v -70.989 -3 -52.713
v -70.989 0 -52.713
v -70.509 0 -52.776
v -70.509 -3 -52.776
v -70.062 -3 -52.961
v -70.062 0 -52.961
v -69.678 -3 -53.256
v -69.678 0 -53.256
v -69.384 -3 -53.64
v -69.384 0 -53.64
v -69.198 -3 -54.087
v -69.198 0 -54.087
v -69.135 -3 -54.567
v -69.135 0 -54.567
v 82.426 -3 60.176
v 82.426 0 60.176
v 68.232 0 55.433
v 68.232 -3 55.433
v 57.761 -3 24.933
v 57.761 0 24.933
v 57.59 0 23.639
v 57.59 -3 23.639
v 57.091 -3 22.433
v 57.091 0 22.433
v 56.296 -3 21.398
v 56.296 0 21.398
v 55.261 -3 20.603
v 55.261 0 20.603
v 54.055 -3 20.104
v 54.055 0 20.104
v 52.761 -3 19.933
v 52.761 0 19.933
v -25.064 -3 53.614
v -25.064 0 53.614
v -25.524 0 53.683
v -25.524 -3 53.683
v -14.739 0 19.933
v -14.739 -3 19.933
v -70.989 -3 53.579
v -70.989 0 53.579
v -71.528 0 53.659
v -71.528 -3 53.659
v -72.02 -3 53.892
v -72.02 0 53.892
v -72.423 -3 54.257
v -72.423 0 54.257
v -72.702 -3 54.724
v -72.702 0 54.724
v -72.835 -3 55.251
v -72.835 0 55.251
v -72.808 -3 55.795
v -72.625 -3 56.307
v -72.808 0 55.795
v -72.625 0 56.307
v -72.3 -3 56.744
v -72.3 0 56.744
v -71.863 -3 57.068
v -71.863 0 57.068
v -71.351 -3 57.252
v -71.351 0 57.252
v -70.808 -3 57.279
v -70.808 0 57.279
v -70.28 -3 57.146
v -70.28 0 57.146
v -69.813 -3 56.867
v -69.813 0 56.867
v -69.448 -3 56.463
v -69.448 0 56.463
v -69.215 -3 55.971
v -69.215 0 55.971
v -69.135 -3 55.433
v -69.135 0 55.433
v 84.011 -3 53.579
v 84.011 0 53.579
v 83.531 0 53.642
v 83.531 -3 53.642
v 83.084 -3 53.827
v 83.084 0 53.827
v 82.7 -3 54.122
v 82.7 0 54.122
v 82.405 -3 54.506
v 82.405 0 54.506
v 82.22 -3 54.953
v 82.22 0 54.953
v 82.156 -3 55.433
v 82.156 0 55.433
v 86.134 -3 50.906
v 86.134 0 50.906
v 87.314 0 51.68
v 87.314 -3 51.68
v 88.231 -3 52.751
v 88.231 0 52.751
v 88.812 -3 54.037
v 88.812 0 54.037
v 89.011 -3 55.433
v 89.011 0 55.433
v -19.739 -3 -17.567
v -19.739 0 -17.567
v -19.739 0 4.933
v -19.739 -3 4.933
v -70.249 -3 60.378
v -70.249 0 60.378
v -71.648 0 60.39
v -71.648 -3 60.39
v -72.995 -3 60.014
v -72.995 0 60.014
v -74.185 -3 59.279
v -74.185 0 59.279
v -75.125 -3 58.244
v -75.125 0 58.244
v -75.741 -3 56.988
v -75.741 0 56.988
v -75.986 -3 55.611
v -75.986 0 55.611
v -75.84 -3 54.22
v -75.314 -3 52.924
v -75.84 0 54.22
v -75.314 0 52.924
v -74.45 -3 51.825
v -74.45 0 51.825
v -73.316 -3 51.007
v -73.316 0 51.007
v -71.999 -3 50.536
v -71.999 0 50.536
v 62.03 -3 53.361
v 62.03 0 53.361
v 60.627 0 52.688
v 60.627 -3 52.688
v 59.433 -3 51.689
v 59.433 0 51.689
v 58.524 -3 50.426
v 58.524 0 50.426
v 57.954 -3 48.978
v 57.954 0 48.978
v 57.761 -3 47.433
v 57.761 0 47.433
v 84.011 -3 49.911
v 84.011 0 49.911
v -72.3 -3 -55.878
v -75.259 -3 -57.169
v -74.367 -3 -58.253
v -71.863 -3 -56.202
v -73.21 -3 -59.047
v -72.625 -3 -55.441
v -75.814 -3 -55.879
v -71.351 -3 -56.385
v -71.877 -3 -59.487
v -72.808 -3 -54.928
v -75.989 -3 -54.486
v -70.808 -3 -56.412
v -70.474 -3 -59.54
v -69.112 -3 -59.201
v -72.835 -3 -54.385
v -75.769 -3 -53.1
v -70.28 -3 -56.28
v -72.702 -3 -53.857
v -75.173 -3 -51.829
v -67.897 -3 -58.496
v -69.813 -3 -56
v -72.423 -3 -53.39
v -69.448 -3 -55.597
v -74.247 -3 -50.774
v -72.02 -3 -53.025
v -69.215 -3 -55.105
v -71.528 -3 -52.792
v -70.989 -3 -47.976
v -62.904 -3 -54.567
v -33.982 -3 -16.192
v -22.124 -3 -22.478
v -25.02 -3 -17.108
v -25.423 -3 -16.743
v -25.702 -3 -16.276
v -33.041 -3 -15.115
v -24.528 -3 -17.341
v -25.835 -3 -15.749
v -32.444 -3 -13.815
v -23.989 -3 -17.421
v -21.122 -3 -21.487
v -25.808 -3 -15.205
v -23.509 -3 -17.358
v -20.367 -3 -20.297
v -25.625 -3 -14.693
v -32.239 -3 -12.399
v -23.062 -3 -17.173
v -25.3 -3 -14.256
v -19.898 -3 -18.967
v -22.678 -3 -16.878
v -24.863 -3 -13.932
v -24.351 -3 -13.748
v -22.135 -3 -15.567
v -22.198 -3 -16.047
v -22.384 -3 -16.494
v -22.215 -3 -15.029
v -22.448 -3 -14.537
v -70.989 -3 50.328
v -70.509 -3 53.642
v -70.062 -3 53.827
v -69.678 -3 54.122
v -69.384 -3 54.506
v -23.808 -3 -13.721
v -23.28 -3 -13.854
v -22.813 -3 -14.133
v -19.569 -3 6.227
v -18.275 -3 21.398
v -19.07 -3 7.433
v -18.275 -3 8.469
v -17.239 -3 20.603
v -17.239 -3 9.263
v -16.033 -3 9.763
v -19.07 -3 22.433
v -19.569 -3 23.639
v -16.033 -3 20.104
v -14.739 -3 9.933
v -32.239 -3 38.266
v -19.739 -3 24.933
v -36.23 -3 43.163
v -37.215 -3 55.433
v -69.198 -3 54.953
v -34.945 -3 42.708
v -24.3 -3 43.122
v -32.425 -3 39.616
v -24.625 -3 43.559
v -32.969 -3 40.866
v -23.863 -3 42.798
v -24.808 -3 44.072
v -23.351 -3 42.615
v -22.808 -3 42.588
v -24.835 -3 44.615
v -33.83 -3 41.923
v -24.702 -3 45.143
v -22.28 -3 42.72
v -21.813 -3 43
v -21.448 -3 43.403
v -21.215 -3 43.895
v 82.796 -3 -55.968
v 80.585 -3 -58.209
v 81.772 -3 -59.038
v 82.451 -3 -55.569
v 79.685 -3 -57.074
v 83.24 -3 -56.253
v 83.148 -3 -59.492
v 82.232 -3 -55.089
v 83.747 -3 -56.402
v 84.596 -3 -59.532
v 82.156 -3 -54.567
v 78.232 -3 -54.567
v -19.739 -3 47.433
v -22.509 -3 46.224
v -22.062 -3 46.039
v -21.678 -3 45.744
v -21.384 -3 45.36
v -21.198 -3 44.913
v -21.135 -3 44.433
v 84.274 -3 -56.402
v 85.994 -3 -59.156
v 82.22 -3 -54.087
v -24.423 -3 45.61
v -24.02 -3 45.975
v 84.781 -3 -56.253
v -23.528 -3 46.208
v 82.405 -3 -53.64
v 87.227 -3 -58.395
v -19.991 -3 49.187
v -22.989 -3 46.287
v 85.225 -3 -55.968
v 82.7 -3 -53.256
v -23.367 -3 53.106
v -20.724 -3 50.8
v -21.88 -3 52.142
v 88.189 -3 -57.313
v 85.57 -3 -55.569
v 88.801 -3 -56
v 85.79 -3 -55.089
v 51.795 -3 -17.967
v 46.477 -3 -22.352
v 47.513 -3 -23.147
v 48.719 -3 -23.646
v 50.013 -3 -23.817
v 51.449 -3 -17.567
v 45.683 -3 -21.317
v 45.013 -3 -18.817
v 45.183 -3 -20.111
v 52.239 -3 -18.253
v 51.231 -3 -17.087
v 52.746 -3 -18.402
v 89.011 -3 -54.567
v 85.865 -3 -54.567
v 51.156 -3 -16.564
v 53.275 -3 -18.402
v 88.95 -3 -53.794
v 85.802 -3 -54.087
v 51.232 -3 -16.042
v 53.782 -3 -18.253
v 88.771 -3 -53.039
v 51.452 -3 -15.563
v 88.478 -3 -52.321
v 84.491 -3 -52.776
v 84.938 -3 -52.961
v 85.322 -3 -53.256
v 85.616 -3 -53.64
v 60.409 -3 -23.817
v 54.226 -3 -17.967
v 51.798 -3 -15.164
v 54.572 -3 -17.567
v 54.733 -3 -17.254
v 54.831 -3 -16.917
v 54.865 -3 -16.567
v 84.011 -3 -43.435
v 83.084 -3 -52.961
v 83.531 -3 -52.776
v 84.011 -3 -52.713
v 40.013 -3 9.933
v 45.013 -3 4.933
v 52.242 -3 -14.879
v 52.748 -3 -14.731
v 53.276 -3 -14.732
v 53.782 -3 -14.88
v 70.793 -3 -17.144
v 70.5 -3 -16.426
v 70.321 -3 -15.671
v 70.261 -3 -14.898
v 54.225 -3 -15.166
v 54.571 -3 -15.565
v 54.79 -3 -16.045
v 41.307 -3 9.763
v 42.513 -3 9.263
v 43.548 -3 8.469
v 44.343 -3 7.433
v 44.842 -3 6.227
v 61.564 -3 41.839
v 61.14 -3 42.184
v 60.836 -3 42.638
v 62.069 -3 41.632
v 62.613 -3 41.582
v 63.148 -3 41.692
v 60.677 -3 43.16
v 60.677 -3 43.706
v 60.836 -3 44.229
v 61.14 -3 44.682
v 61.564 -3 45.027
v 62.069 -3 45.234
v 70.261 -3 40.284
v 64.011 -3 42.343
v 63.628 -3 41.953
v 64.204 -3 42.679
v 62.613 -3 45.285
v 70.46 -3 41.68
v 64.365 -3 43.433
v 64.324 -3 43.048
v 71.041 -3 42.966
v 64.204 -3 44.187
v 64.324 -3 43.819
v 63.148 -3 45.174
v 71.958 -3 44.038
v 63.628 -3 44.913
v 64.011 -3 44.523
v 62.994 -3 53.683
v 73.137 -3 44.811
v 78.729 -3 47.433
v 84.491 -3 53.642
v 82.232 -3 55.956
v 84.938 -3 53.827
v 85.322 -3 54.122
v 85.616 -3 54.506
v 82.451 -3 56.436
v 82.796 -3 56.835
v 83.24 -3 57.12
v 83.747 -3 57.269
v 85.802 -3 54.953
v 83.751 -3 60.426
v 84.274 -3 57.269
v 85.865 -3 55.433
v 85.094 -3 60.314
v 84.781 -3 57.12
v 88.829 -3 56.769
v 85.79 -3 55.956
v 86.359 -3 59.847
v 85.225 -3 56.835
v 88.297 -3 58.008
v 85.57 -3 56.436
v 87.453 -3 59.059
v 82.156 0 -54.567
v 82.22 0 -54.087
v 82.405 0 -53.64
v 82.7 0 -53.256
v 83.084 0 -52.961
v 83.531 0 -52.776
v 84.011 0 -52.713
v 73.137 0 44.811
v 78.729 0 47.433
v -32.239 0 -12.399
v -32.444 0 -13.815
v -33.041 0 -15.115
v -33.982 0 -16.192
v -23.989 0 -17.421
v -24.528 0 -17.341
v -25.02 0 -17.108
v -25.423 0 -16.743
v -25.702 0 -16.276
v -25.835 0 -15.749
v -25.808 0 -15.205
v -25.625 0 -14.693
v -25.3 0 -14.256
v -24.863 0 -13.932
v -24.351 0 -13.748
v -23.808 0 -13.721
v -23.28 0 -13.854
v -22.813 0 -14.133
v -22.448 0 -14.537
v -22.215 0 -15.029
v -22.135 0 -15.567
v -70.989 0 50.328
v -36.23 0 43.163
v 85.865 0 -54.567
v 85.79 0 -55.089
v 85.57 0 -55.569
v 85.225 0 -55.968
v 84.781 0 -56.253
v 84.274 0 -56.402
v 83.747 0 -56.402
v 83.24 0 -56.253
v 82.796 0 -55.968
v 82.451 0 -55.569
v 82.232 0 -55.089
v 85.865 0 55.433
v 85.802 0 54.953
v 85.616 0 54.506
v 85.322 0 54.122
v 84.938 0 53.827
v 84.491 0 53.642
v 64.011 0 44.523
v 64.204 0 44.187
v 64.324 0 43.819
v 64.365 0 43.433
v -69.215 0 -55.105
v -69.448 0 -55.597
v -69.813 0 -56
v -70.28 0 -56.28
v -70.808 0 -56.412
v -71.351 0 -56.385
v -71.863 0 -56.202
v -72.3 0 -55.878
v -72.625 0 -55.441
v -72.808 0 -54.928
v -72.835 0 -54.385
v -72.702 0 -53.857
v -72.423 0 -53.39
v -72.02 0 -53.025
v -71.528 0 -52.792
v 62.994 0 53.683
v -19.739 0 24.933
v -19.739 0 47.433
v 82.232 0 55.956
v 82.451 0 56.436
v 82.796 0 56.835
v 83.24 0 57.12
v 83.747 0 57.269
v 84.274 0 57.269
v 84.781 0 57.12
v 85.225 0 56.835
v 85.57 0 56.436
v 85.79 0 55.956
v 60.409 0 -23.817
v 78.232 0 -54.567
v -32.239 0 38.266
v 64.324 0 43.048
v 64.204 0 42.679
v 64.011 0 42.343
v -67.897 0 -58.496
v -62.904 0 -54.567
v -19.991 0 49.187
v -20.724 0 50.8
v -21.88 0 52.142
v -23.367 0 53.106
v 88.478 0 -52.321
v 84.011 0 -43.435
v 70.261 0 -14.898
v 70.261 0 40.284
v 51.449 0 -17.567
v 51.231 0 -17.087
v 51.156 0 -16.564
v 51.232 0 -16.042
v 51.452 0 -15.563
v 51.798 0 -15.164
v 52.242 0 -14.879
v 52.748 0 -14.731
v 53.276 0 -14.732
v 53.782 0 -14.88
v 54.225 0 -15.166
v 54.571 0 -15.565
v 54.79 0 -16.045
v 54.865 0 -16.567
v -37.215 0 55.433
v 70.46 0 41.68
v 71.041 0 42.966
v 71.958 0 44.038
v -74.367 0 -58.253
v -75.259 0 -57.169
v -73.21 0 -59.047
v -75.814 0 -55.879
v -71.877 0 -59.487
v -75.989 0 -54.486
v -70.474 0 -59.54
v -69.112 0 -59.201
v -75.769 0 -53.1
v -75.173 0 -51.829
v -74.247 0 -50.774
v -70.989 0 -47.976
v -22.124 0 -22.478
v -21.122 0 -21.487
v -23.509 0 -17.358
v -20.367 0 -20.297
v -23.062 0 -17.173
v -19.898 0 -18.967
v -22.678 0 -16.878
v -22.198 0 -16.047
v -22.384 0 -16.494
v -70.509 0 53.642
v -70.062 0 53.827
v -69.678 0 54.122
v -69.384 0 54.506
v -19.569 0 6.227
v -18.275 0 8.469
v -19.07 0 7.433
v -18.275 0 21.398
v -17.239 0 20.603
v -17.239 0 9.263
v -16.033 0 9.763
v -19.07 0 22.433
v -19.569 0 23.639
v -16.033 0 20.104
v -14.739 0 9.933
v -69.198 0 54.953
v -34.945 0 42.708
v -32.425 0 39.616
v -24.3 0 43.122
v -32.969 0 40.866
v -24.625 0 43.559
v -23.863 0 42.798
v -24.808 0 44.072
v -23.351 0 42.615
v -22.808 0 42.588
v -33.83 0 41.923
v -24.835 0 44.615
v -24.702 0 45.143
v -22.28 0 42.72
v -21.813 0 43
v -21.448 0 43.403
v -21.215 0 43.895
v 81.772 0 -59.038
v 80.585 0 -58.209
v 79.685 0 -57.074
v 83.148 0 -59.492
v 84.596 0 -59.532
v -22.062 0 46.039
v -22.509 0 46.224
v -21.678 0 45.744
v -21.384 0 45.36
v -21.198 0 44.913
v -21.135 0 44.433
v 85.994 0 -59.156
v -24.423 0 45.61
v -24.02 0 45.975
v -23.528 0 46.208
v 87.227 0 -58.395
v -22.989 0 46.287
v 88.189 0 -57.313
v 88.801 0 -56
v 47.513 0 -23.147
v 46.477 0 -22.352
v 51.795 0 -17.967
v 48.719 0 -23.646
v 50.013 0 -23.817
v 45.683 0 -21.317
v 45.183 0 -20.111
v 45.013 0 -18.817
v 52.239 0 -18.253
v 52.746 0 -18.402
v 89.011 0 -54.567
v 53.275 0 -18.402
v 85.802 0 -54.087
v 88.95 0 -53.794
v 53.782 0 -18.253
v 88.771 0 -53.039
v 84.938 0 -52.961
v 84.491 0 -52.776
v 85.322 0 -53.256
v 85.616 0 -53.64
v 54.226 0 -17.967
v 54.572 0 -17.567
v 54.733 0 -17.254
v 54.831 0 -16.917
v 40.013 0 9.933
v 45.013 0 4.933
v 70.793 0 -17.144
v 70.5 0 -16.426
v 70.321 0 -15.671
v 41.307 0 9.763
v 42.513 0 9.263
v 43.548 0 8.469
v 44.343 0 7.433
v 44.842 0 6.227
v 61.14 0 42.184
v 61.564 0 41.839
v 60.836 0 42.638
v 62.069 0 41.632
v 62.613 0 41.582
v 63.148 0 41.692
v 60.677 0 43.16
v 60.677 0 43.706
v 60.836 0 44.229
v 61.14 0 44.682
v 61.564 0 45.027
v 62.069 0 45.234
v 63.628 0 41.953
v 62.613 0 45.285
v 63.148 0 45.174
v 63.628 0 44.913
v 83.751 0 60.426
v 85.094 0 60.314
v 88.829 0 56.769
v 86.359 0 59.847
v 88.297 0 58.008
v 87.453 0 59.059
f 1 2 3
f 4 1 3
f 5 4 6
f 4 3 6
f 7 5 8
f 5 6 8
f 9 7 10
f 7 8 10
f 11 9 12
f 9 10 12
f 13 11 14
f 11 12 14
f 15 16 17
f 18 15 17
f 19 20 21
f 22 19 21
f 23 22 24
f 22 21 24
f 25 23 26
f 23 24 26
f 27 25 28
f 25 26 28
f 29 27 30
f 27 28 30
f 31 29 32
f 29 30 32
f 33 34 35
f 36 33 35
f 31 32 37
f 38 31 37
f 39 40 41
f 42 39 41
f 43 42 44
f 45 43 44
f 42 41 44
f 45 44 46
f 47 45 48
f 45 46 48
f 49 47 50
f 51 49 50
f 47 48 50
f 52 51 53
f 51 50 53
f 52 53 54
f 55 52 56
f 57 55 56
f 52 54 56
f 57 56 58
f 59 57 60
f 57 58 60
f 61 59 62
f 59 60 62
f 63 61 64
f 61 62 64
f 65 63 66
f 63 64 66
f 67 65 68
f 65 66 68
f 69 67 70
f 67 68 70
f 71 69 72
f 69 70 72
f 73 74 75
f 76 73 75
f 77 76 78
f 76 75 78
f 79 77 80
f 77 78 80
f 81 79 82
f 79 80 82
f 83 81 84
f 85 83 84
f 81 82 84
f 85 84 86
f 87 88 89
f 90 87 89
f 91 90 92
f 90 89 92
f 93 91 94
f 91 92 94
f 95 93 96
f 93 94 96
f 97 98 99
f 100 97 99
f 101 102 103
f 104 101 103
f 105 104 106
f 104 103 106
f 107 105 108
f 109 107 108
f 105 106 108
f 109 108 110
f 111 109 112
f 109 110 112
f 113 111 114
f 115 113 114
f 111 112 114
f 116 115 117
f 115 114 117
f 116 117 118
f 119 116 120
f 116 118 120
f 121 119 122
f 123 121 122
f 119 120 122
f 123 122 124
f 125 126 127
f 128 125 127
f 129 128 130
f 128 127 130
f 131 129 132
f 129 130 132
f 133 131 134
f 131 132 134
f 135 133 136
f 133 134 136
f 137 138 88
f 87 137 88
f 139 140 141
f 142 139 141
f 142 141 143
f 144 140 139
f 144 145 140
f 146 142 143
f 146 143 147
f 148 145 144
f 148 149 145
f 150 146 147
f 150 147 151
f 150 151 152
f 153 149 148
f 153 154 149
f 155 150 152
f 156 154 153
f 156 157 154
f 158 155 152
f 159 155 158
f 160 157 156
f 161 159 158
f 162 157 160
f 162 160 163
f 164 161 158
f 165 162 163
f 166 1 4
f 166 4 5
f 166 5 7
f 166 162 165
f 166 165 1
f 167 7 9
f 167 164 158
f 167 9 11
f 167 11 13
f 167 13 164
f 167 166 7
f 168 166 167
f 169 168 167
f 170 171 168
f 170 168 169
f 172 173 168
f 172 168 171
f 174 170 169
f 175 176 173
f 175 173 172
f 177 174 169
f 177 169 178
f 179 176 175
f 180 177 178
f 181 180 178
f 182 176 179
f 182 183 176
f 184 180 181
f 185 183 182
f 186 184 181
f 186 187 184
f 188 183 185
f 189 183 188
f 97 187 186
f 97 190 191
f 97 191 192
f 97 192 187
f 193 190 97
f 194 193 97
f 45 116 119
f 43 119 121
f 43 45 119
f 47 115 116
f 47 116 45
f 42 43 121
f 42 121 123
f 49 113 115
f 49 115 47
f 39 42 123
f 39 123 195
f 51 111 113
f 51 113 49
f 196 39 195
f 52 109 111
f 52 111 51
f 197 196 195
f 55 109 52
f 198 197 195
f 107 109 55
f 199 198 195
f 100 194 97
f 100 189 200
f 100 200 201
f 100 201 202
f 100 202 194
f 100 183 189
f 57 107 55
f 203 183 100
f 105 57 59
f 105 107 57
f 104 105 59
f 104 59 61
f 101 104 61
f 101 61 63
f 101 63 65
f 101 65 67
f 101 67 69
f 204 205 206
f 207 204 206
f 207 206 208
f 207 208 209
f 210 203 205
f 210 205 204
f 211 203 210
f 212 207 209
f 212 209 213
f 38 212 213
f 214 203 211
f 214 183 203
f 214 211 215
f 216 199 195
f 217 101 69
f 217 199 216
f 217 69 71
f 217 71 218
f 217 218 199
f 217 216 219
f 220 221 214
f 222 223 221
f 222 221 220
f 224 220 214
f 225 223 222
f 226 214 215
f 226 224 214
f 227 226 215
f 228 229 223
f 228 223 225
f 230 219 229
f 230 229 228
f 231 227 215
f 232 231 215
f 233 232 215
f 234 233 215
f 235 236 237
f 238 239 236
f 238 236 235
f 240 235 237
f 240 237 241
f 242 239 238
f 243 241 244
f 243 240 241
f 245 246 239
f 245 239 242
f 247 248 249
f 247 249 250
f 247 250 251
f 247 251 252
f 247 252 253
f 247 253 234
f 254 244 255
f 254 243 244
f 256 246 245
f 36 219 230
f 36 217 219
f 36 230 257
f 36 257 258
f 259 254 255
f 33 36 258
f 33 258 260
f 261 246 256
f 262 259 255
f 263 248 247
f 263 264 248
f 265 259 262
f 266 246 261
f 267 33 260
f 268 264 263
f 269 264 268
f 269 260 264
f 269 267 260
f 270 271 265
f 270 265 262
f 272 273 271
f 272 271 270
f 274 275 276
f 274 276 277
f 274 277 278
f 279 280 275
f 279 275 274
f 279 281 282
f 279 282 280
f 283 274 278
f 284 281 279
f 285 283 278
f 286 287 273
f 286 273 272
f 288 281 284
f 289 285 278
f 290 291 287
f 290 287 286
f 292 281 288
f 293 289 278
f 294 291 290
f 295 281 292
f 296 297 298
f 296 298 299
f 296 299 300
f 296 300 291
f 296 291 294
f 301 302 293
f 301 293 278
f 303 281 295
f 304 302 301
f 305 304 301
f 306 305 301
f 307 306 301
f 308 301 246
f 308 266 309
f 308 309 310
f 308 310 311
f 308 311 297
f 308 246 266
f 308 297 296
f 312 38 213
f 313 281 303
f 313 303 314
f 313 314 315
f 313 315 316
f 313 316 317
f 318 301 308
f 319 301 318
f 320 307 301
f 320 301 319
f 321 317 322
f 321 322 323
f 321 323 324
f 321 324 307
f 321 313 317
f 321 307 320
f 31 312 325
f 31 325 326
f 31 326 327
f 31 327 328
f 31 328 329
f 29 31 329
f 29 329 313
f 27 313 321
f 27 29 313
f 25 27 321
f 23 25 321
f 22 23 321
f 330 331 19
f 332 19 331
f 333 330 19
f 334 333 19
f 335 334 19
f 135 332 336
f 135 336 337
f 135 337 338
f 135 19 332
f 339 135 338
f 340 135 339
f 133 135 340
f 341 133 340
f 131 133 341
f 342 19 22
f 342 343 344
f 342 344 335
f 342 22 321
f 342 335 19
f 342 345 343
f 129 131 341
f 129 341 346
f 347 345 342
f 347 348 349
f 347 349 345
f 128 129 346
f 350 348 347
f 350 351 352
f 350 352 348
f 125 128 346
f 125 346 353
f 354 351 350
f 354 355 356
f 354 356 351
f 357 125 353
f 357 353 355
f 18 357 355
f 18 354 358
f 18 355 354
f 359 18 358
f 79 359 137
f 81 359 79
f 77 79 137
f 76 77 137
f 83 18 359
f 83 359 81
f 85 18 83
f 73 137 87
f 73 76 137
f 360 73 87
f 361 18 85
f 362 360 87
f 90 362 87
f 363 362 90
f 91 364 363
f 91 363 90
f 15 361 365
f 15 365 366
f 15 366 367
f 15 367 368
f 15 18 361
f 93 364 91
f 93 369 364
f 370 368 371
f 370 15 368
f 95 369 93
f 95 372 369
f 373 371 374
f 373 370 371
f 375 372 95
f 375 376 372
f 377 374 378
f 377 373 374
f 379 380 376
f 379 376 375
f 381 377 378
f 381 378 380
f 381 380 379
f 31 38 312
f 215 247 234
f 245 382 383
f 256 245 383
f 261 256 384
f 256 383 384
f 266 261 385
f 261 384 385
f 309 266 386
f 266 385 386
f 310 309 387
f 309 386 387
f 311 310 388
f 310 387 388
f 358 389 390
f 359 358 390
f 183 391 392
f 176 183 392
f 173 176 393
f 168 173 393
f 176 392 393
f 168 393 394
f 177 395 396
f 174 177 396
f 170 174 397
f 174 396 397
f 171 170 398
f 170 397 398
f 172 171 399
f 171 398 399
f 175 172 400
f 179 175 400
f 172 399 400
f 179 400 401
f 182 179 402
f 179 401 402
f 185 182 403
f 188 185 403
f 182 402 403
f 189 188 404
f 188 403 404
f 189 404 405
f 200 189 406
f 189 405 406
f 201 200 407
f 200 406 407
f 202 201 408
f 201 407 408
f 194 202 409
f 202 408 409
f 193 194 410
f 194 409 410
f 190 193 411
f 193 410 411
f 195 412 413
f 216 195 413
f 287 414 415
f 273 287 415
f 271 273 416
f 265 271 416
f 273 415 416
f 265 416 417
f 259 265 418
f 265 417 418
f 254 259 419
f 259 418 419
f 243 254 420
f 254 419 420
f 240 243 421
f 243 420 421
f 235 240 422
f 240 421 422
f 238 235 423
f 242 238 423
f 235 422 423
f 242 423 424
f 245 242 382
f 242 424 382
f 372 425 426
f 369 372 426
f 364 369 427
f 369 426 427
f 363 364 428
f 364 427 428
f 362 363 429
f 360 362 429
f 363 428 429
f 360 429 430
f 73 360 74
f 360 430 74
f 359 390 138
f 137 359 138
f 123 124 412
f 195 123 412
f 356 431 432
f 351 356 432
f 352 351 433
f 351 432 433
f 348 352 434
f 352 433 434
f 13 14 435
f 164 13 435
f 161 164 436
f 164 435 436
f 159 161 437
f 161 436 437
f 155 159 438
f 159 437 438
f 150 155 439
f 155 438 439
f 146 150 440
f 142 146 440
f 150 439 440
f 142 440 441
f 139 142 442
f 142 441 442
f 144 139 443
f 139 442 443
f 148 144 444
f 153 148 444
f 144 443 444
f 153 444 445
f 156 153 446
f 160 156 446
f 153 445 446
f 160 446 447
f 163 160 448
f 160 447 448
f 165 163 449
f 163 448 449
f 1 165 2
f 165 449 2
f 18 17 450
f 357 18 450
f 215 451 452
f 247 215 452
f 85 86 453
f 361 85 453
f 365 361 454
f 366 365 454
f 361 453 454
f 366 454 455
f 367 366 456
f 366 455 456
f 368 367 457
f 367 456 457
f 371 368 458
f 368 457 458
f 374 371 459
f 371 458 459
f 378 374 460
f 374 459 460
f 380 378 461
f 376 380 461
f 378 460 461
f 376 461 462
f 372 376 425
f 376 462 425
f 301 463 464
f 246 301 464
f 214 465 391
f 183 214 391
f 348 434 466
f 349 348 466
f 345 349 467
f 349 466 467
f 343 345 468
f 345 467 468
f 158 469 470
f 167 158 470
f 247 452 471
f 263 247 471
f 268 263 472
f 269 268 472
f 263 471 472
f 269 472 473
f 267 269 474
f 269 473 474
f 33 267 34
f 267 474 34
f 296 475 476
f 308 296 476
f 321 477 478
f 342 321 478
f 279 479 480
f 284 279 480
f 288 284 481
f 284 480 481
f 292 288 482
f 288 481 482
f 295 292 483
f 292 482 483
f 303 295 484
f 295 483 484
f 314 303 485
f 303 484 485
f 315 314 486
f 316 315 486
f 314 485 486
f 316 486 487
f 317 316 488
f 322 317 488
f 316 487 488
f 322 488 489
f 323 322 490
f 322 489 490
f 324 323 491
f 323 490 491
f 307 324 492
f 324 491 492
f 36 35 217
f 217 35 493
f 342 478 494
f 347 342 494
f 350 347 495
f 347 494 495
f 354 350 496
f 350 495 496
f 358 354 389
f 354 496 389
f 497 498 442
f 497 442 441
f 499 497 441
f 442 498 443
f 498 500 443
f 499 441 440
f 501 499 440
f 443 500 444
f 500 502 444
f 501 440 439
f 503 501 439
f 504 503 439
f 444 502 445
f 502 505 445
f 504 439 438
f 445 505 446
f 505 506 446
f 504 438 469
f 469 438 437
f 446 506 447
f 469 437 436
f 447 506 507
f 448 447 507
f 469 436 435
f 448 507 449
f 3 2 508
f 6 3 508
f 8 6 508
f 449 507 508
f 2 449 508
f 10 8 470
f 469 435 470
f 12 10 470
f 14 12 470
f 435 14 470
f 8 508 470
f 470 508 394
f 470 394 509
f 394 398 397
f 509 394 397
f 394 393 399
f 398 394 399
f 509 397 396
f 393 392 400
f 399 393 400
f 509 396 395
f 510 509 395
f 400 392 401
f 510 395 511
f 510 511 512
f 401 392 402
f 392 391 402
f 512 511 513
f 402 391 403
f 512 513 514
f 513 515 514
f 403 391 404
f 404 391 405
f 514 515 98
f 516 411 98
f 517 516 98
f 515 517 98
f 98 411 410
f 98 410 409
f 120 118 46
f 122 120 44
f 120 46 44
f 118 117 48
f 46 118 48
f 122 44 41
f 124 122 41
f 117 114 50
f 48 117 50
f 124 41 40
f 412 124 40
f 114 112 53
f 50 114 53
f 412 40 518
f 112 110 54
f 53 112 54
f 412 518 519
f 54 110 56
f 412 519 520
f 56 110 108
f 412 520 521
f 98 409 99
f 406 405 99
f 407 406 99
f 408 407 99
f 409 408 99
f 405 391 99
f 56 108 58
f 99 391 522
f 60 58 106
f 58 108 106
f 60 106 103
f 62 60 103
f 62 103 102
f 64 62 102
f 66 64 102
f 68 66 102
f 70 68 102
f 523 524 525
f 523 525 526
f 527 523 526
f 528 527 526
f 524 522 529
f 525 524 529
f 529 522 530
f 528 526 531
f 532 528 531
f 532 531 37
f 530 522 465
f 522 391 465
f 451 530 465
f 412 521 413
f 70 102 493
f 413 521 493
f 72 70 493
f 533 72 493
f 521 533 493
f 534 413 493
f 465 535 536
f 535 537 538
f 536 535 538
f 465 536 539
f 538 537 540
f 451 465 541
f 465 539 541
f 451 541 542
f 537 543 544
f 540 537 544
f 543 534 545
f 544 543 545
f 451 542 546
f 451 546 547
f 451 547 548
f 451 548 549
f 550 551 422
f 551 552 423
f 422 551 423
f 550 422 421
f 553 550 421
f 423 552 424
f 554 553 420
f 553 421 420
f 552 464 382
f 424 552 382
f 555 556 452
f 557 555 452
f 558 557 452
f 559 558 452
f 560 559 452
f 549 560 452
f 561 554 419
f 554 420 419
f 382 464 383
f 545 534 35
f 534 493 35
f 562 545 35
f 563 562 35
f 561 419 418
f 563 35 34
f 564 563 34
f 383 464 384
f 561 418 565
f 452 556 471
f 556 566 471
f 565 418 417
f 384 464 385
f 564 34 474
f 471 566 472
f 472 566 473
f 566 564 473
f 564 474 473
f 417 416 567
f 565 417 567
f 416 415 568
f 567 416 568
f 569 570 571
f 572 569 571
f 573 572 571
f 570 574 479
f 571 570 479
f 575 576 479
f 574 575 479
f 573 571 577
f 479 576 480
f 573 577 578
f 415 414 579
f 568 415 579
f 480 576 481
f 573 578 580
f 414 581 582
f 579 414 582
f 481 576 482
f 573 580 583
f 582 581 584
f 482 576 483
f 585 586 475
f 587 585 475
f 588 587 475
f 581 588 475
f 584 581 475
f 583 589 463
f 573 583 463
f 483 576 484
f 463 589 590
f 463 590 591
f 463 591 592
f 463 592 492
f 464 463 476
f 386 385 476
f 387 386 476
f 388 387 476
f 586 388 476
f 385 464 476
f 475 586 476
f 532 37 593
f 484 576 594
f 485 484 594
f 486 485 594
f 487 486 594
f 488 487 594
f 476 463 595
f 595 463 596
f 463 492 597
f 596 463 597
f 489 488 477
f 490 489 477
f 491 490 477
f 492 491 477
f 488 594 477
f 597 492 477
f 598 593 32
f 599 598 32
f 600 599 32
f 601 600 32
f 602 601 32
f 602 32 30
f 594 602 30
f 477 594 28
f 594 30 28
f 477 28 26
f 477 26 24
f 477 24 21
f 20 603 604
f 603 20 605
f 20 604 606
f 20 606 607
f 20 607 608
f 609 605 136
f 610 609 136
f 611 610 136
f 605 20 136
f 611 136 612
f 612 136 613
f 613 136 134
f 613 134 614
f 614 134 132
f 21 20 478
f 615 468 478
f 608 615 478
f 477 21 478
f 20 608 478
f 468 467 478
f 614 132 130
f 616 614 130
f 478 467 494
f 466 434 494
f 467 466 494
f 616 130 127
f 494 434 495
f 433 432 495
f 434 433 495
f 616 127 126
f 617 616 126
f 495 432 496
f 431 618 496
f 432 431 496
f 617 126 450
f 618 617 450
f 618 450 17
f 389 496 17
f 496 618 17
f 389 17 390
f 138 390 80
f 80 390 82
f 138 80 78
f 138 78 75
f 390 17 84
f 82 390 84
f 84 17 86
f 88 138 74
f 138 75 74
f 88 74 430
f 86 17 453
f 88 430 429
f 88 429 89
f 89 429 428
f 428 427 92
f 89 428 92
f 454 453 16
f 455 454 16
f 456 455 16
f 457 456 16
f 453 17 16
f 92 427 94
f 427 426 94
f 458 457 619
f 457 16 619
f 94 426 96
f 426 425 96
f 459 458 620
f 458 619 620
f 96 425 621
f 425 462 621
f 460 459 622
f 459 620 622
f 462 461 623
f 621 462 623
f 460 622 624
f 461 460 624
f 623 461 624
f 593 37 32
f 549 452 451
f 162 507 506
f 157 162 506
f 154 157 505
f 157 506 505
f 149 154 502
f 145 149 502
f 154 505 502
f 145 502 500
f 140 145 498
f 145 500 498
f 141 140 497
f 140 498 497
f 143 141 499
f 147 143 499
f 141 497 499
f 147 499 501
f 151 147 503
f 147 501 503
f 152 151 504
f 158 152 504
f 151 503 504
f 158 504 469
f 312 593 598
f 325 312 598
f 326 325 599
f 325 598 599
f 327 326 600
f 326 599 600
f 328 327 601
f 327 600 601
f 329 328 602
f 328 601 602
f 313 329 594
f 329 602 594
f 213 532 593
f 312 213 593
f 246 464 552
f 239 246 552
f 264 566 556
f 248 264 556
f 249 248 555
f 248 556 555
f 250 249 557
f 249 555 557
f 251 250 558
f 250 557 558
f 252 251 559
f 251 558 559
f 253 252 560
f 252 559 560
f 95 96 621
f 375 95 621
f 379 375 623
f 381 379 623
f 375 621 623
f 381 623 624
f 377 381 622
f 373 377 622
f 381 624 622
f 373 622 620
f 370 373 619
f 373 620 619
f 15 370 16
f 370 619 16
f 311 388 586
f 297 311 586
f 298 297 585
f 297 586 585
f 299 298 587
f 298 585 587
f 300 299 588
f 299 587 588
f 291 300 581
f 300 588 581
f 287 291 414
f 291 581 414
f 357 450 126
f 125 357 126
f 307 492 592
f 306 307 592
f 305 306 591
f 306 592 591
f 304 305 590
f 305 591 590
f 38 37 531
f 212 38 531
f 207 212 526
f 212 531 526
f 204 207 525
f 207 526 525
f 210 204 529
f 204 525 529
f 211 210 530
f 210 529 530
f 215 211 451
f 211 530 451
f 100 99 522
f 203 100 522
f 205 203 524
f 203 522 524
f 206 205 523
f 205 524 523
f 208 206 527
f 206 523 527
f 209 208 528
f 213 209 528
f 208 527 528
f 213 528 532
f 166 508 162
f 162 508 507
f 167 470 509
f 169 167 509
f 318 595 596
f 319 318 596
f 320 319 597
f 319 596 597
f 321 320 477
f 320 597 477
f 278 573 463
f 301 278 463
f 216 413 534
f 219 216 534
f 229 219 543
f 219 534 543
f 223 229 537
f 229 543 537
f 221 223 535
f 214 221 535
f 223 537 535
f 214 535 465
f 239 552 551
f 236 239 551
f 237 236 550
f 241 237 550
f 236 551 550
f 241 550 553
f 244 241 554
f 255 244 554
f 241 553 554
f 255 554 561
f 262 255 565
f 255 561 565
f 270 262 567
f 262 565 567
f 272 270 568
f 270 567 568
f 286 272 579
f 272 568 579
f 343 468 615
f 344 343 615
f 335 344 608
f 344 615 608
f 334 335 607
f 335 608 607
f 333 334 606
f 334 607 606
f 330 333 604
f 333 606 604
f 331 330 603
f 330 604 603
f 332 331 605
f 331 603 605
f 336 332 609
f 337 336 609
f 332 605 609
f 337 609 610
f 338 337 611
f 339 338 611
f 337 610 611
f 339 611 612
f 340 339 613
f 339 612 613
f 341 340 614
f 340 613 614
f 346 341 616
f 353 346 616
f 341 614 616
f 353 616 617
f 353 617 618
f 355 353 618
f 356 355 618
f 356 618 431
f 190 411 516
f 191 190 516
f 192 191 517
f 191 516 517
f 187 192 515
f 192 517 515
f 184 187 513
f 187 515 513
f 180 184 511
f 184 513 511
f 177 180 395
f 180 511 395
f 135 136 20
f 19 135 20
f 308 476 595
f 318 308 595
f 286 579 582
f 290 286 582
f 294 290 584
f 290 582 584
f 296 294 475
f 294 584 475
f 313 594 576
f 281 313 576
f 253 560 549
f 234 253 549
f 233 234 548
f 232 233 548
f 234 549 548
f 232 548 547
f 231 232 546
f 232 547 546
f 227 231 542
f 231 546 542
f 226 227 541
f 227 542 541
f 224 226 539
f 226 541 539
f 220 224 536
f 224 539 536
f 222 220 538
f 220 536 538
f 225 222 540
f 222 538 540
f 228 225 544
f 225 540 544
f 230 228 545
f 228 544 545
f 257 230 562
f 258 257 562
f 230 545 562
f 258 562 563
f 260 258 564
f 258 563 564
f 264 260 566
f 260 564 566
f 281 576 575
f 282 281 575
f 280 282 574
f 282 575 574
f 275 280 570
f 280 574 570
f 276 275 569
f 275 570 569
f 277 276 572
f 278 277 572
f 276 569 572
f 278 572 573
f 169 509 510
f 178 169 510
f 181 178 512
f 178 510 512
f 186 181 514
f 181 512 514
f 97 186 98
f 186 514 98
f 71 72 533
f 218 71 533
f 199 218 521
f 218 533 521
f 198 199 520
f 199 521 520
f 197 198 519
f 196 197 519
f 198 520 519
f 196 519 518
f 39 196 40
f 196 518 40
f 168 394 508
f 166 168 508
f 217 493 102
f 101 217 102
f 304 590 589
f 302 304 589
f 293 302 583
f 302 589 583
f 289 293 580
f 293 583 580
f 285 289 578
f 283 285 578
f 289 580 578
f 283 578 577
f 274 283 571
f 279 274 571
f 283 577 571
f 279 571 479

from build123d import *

# Parameters (mm, degrees)
F1_DEPTH = 3


# Not quite as in the source:
# - a feature names something its author has since deleted; it is built from what else it names


with BuildPart() as f1:
    # F0 (on Front) → F1 (new body)
    with BuildSketch(Plane.XZ):
        with BuildLine():
            Line((-37.214977254, 55.4332367199), (-65.9893809259, 55.4332367199))
            ThreePointArc((-65.9893809259, 55.4332367199), (-67.45384702, 51.8977028139), (-70.9893809259, 50.4332367199))
            Line((-70.9893809259, 50.4332367199), (-70.9893809259, 50.3281080825))
            Line((-70.9893809259, 50.3281080825), (-36.2299078147, 43.1628040761))
            ThreePointArc((-36.2299078147, 43.1628040761), (-33.3633413521, 41.4242986902), (-32.2393809259, 38.2657678257))
            Line((-32.2393809259, 38.2657678257), (-32.2393809259, -12.3991493743))
            ThreePointArc((-32.2393809259, -12.3991493743), (-32.6957967743, -14.4862150316), (-33.9817181489, -16.1922527517))
            Line((-33.9817181489, -16.1922527517), (-70.9893809259, -47.9758540661))
            Line((-70.9893809259, -47.9758540661), (-70.9893809259, -49.5667632801))
            ThreePointArc((-70.9893809259, -49.5667632801), (-67.45384702, -51.0312293742), (-65.9893809259, -54.5667632801))
            Line((-65.9893809259, -54.5667632801), (-62.9038139694, -54.5667632801))
            Line((-62.9038139694, -54.5667632801), (-22.1244695142, -22.4784798619))
            ThreePointArc((-22.1244695142, -22.4784798619), (-31.8953409933, -19.6117903415), (-25.9893809259, -11.3167632801))
            Line((-25.9893809259, -11.3167632801), (-25.9893809259, 41.1832367199))
            ThreePointArc((-25.9893809259, 41.1832367199), (-32.2393809259, 47.4332367199), (-25.9893809259, 53.6832367199))
            Line((-25.9893809259, 53.6832367199), (-25.5241895532, 53.6832367199))
            Line((-25.5241895532, 53.6832367199), (-37.214977254, 55.4332367199))
        make_face()
        with BuildLine():
            ThreePointArc((-70.2491754069, 60.3781427644), (-67.2011737249, 58.6965917729), (-65.9893809259, 55.4332367199))
            Line((-65.9893809259, 55.4332367199), (-37.214977254, 55.4332367199))
            Line((-37.214977254, 55.4332367199), (-70.2491754069, 60.3781427644))
        make_face()
        with BuildLine():
            ThreePointArc((-19.7393809259, 47.4332367199), (-21.2541219247, 51.5124305362), (-25.0641240271, 53.6143692756))
            ThreePointArc((-25.0641240271, 53.6143692756), (-25.5254727848, 53.6659960796), (-25.9893809259, 53.6832367199))
            ThreePointArc((-25.9893809259, 53.6832367199), (-32.2393809259, 47.4332367199), (-25.9893809259, 41.1832367199))
            ThreePointArc((-25.9893809259, 41.1832367199), (-21.5699635435, 43.0138193375), (-19.7393809259, 47.4332367199))
        make_face()
        with BuildLine():
            ThreePointArc((-21.1351809259, 44.4332367199), (-24.3004983196, 43.1221193262), (-22.9893809259, 46.2874367199))
            ThreePointArc((-22.9893809259, 46.2874367199), (-21.6782635322, 45.7443541135), (-21.1351809259, 44.4332367199))
        make_face(mode=Mode.SUBTRACT)
        with BuildLine():
            Line((-19.7393809259, 24.9332367629), (-19.7393809259, 47.4332367199))
            ThreePointArc((-19.7393809259, 47.4332367199), (-21.5699635435, 43.0138193375), (-25.9893809259, 41.1832367199))
            Line((-25.9893809259, 41.1832367199), (-25.9893809259, -11.3167632801))
            ThreePointArc((-25.9893809259, -11.3167632801), (-21.5699635435, -13.1473458977), (-19.7393809259, -17.5667632801))
            Line((-19.7393809259, -17.5667632801), (-19.7393809259, 4.9332367199))
            ThreePointArc((-19.7393809259, 4.9332367199), (-18.2749148318, 8.4687706258), (-14.7393809259, 9.9332367199))
            Line((-14.7393809259, 9.9332367199), (40.0127460063, 9.9332367199))
            ThreePointArc((40.0127460063, 9.9332367199), (43.5482799122, 8.4687706258), (45.0127460063, 4.9332367199))
            Line((45.0127460063, 4.9332367199), (45.0127460063, -17.5667632801))
            Line((45.0127460063, -17.5667632801), (51.449190997, -17.5667632801))
            ThreePointArc((51.449190997, -17.5667632801), (52.4896307348, -14.7872608805), (54.8648190741, -16.5667632801))
            ThreePointArc((54.8648190741, -16.5667632801), (54.7901214737, -17.0877516195), (54.5720471512, -17.5667632801))
            Line((54.5720471512, -17.5667632801), (57.7606190741, -17.5667632801))
            ThreePointArc((57.7606190741, -17.5667632801), (59.5912016917, -13.1473458977), (64.0106190741, -11.3167632801))
            Line((64.0106190741, -11.3167632801), (64.0106190741, 41.1832367199))
            ThreePointArc((64.0106190741, 41.1832367199), (59.5912016917, 43.0138193375), (57.7606190741, 47.4332367199))
            Line((57.7606190741, 47.4332367199), (57.7606190741, 24.9332367629))
            ThreePointArc((57.7606190741, 24.9332367629), (56.29615298, 21.3977028569), (52.7606190741, 19.9332367629))
            Line((52.7606190741, 19.9332367629), (-14.7393809259, 19.9332367629))
            ThreePointArc((-14.7393809259, 19.9332367629), (-18.2749148318, 21.3977028569), (-19.7393809259, 24.9332367629))
        make_face()
        with BuildLine():
            Line((-25.9893809259, -17.5667632801), (-25.9893809259, -11.3167632801))
            ThreePointArc((-25.9893809259, -11.3167632801), (-31.8953409933, -19.6117903415), (-22.1244695142, -22.4784798619))
            ThreePointArc((-22.1244695142, -22.4784798619), (-20.36718401, -20.2968551904), (-19.7393809259, -17.5667632801))
            Line((-19.7393809259, -17.5667632801), (-23.9893809259, -17.5667632801))
            Line((-23.9893809259, -17.5667632801), (-25.9893809259, -17.5667632801))
        make_face()
        with BuildLine():
            ThreePointArc((-19.7393809259, -17.5667632801), (-21.5699635435, -13.1473458977), (-25.9893809259, -11.3167632801))
            Line((-25.9893809259, -11.3167632801), (-25.9893809259, -17.5667632801))
            Line((-25.9893809259, -17.5667632801), (-23.9893809259, -17.5667632801))
            Line((-23.9893809259, -17.5667632801), (-19.7393809259, -17.5667632801))
        make_face()
        with BuildLine():
            ThreePointArc((-22.1351809259, -15.5667632801), (-22.6782635322, -16.8778806738), (-23.9893809259, -17.4209632801))
            ThreePointArc((-23.9893809259, -17.4209632801), (-25.3004983196, -14.2556458865), (-22.1351809259, -15.5667632801))
        make_face(mode=Mode.SUBTRACT)
        with BuildLine():
            Line((-62.9038139694, -54.5667632801), (-65.9893809259, -54.5667632801))
            ThreePointArc((-65.9893809259, -54.5667632801), (-66.4916233931, -56.7508368083), (-67.8974517965, -58.4961365456))
            Line((-67.8974517965, -58.4961365456), (-62.9038139694, -54.5667632801))
        make_face()
        with BuildLine():
            Line((-70.9893809259, -49.5667632801), (-70.9893809259, -47.9758540661))
            Line((-70.9893809259, -47.9758540661), (-74.2470437029, -50.7736599027))
            ThreePointArc((-74.2470437029, -50.7736599027), (-72.7264018114, -49.8781858367), (-70.9893809259, -49.5667632801))
        make_face()
        with BuildLine():
            Line((51.449190997, -17.5667632801), (45.0127460063, -17.5667632801))
            Line((45.0127460063, -17.5667632801), (45.0127460063, -18.8167632801))
            ThreePointArc((45.0127460063, -18.8167632801), (46.4772121003, -22.3522971861), (50.0127460063, -23.8167632801))
            Line((50.0127460063, -23.8167632801), (60.4091643842, -23.8167632801))
            Line((60.4091643842, -23.8167632801), (58.6032088142, -20.7008363936))
            ThreePointArc((58.6032088142, -20.7008363936), (57.974941228, -19.1894440675), (57.7606190741, -17.5667632801))
            Line((57.7606190741, -17.5667632801), (54.5720471512, -17.5667632801))
            ThreePointArc((54.5720471512, -17.5667632801), (53.0106190741, -18.4209632801), (51.449190997, -17.5667632801))
        make_face()
        with BuildLine():
            ThreePointArc((64.0106190741, 53.6832367199), (63.0073411856, 53.6021858588), (62.0300845889, 53.361135433))
            ThreePointArc((62.0300845889, 53.361135433), (58.9390887068, 51.0859178904), (57.7606190741, 47.4332367199))
            Line((57.7606190741, 47.4332367199), (64.0106190741, 47.4332367199))
            Line((64.0106190741, 47.4332367199), (70.2606190741, 47.4332367199))
            ThreePointArc((70.2606190741, 47.4332367199), (68.4300364565, 51.8526541023), (64.0106190741, 53.6832367199))
        make_face()
        with BuildLine():
            Line((82.4261914859, 60.1755556903), (68.2320500904, 55.4332367199))
            Line((68.2320500904, 55.4332367199), (79.0106190741, 55.4332367199))
            ThreePointArc((79.0106190741, 55.4332367199), (79.9533947803, 58.3553816563), (82.4261914859, 60.1755556903))
        make_face()
        with BuildLine():
            Line((79.0106190741, 55.4332367199), (68.2320500904, 55.4332367199))
            Line((68.2320500904, 55.4332367199), (62.9941595991, 53.6832367199))
            Line((62.9941595991, 53.6832367199), (64.0106190741, 53.6832367199))
            ThreePointArc((64.0106190741, 53.6832367199), (68.4300364565, 51.8526541023), (70.2606190741, 47.4332367199))
            Line((70.2606190741, 47.4332367199), (78.7288252988, 47.4332367199))
            Line((78.7288252988, 47.4332367199), (84.0106190741, 49.9105738121))
            Line((84.0106190741, 49.9105738121), (84.0106190741, 50.4332367199))
            ThreePointArc((84.0106190741, 50.4332367199), (80.4750851682, 51.8977028139), (79.0106190741, 55.4332367199))
        make_face()
        with BuildLine():
            Line((78.7288252988, 47.4332367199), (70.2606190741, 47.4332367199))
            ThreePointArc((70.2606190741, 47.4332367199), (68.4300364565, 43.0138193375), (64.0106190741, 41.1832367199))
            Line((64.0106190741, 41.1832367199), (64.0106190741, -11.3167632801))
            ThreePointArc((64.0106190741, -11.3167632801), (68.4300364565, -13.1473458977), (70.2606190741, -17.5667632801))
            ThreePointArc((70.2606190741, -17.5667632801), (68.4300364565, -21.9861806625), (64.0106190741, -23.8167632801))
            Line((64.0106190741, -23.8167632801), (60.4091643842, -23.8167632801))
            Line((60.4091643842, -23.8167632801), (78.2315125337, -54.5667632801))
            Line((78.2315125337, -54.5667632801), (79.0106190741, -54.5667632801))
            ThreePointArc((79.0106190741, -54.5667632801), (80.4750851682, -51.0312293742), (84.0106190741, -49.5667632801))
            Line((84.0106190741, -49.5667632801), (84.0106190741, -43.4349288765))
            Line((84.0106190741, -43.4349288765), (70.7933680849, -17.1438614305))
            ThreePointArc((70.7933680849, -17.1438614305), (70.3956290974, -16.0521179023), (70.2606190741, -14.898050085))
            Line((70.2606190741, -14.898050085), (70.2606190741, 40.2838696489))
            ThreePointArc((70.2606190741, 40.2838696489), (71.0406603386, 42.965650451), (73.1373983825, 44.810671378))
            Line((73.1373983825, 44.810671378), (78.7288252988, 47.4332367199))
        make_face()
        with BuildLine():
            Line((64.0106190741, 47.4332367199), (57.7606190741, 47.4332367199))
            ThreePointArc((57.7606190741, 47.4332367199), (59.5912016917, 43.0138193375), (64.0106190741, 41.1832367199))
            Line((64.0106190741, 41.1832367199), (64.0106190741, 42.3432561512))
            ThreePointArc((64.0106190741, 42.3432561512), (60.6564190741, 43.4332367199), (64.0106190741, 44.5232172885))
            Line((64.0106190741, 44.5232172885), (64.0106190741, 47.4332367199))
        make_face()
        with BuildLine():
            Line((64.0106190741, -17.5667632801), (64.0106190741, -11.3167632801))
            ThreePointArc((64.0106190741, -11.3167632801), (59.5912016917, -13.1473458977), (57.7606190741, -17.5667632801))
            Line((57.7606190741, -17.5667632801), (64.0106190741, -17.5667632801))
        make_face()
        with BuildLine():
            ThreePointArc((70.2606190741, -17.5667632801), (68.4300364565, -13.1473458977), (64.0106190741, -11.3167632801))
            Line((64.0106190741, -11.3167632801), (64.0106190741, -17.5667632801))
            Line((64.0106190741, -17.5667632801), (57.7606190741, -17.5667632801))
            ThreePointArc((57.7606190741, -17.5667632801), (57.974941228, -19.1894440675), (58.6032088142, -20.7008363936))
            ThreePointArc((58.6032088142, -20.7008363936), (60.8901589285, -22.9820406026), (64.0106190741, -23.8167632801))
            ThreePointArc((64.0106190741, -23.8167632801), (68.4300364565, -21.9861806625), (70.2606190741, -17.5667632801))
        make_face()
        with BuildLine():
            Line((58.6032088142, -20.7008363936), (60.4091643842, -23.8167632801))
            Line((60.4091643842, -23.8167632801), (64.0106190741, -23.8167632801))
            ThreePointArc((64.0106190741, -23.8167632801), (60.8901589285, -22.9820406026), (58.6032088142, -20.7008363936))
        make_face()
        with BuildLine():
            Line((88.4778700633, -52.3209519346), (84.0106190741, -43.4349288765))
            Line((84.0106190741, -43.4349288765), (84.0106190741, -49.5667632801))
            ThreePointArc((84.0106190741, -49.5667632801), (86.6346372974, -50.3106466976), (88.4778700633, -52.3209519346))
        make_face()
        with BuildLine():
            ThreePointArc((-70.9893809259, 53.5790367199), (-72.3004983196, 56.7443541135), (-69.1351809259, 55.4332367199))
            Line((-69.1351809259, 55.4332367199), (-65.9893809259, 55.4332367199))
            ThreePointArc((-65.9893809259, 55.4332367199), (-67.2011737249, 58.6965917729), (-70.2491754069, 60.3781427644))
            ThreePointArc((-70.2491754069, 60.3781427644), (-75.9121934648, 56.3084033935), (-71.9988540371, 50.5362004695))
            ThreePointArc((-71.9988540371, 50.5362004695), (-71.4967361998, 50.4590442602), (-70.9893809259, 50.4332367199))
            Line((-70.9893809259, 50.4332367199), (-70.9893809259, 53.5790367199))
        make_face()
        with BuildLine():
            Line((-65.9893809259, 55.4332367199), (-69.1351809259, 55.4332367199))
            ThreePointArc((-69.1351809259, 55.4332367199), (-69.6782635322, 54.1221193262), (-70.9893809259, 53.5790367199))
            Line((-70.9893809259, 53.5790367199), (-70.9893809259, 50.4332367199))
            ThreePointArc((-70.9893809259, 50.4332367199), (-67.45384702, 51.8977028139), (-65.9893809259, 55.4332367199))
        make_face()
        with BuildLine():
            ThreePointArc((82.4261914859, 60.1755556903), (79.9533947803, 58.3553816563), (79.0106190741, 55.4332367199))
            Line((79.0106190741, 55.4332367199), (82.1564190741, 55.4332367199))
            ThreePointArc((82.1564190741, 55.4332367199), (84.0106190741, 57.2874367199), (85.8648190741, 55.4332367199))
            ThreePointArc((85.8648190741, 55.4332367199), (85.3217364678, 54.1221193262), (84.0106190741, 53.5790367199))
            Line((84.0106190741, 53.5790367199), (84.0106190741, 50.4332367199))
            ThreePointArc((84.0106190741, 50.4332367199), (85.0982751214, 50.5529698908), (86.1338397657, 50.9064349908))
            ThreePointArc((86.1338397657, 50.9064349908), (88.2305778096, 52.7514559177), (89.0106190741, 55.4332367199))
            ThreePointArc((89.0106190741, 55.4332367199), (86.9327640105, 59.4904610137), (82.4261914859, 60.1755556903))
        make_face()
        with BuildLine():
            Line((82.1564190741, 55.4332367199), (79.0106190741, 55.4332367199))
            ThreePointArc((79.0106190741, 55.4332367199), (80.4750851682, 51.8977028139), (84.0106190741, 50.4332367199))
            Line((84.0106190741, 50.4332367199), (84.0106190741, 53.5790367199))
            ThreePointArc((84.0106190741, 53.5790367199), (82.6995016804, 54.1221193262), (82.1564190741, 55.4332367199))
        make_face()
        with BuildLine():
            ThreePointArc((-65.9893809259, -54.5667632801), (-67.45384702, -51.0312293742), (-70.9893809259, -49.5667632801))
            Line((-70.9893809259, -49.5667632801), (-70.9893809259, -52.7125632801))
            ThreePointArc((-70.9893809259, -52.7125632801), (-69.6782635322, -53.2556458865), (-69.1351809259, -54.5667632801))
            Line((-69.1351809259, -54.5667632801), (-65.9893809259, -54.5667632801))
        make_face()
        with BuildLine():
            Line((-70.9893809259, -52.7125632801), (-70.9893809259, -49.5667632801))
            ThreePointArc((-70.9893809259, -49.5667632801), (-72.7264018114, -49.8781858367), (-74.2470437029, -50.7736599027))
            ThreePointArc((-74.2470437029, -50.7736599027), (-74.8515083558, -57.7422902781), (-67.8974517965, -58.4961365456))
            ThreePointArc((-67.8974517965, -58.4961365456), (-66.4916233931, -56.7508368083), (-65.9893809259, -54.5667632801))
            Line((-65.9893809259, -54.5667632801), (-69.1351809259, -54.5667632801))
            ThreePointArc((-69.1351809259, -54.5667632801), (-72.3004983196, -55.8778806738), (-70.9893809259, -52.7125632801))
        make_face()
        with BuildLine():
            ThreePointArc((84.0106190741, -49.5667632801), (80.4750851682, -51.0312293742), (79.0106190741, -54.5667632801))
            Line((79.0106190741, -54.5667632801), (82.1564190741, -54.5667632801))
            ThreePointArc((82.1564190741, -54.5667632801), (82.6995016804, -53.2556458865), (84.0106190741, -52.7125632801))
            Line((84.0106190741, -52.7125632801), (84.0106190741, -49.5667632801))
        make_face()
        with BuildLine():
            Line((82.1564190741, -54.5667632801), (79.0106190741, -54.5667632801))
            ThreePointArc((79.0106190741, -54.5667632801), (79.1820767972, -55.86490791), (79.6846908662, -57.0740217709))
            ThreePointArc((79.6846908662, -57.0740217709), (85.308763704, -59.395305557), (89.0106190741, -54.5667632801))
            ThreePointArc((89.0106190741, -54.5667632801), (88.8756090508, -53.4126954628), (88.4778700633, -52.3209519346))
            ThreePointArc((88.4778700633, -52.3209519346), (86.6346372974, -50.3106466976), (84.0106190741, -49.5667632801))
            Line((84.0106190741, -49.5667632801), (84.0106190741, -52.7125632801))
            ThreePointArc((84.0106190741, -52.7125632801), (85.3217364678, -53.2556458865), (85.8648190741, -54.5667632801))
            ThreePointArc((85.8648190741, -54.5667632801), (84.0106190741, -56.4209632801), (82.1564190741, -54.5667632801))
        make_face()
        with BuildLine():
            Line((79.0106190741, -54.5667632801), (78.2315125337, -54.5667632801))
            Line((78.2315125337, -54.5667632801), (79.6846908662, -57.0740217709))
            ThreePointArc((79.6846908662, -57.0740217709), (79.1820767972, -55.86490791), (79.0106190741, -54.5667632801))
        make_face()
        with BuildLine():
            ThreePointArc((86.1338397657, 50.9064349908), (85.0982751214, 50.5529698908), (84.0106190741, 50.4332367199))
            Line((84.0106190741, 50.4332367199), (84.0106190741, 49.9105738121))
            Line((84.0106190741, 49.9105738121), (86.1338397657, 50.9064349908))
        make_face()
        with BuildLine():
            Line((64.0106190741, 53.6832367199), (62.9941595991, 53.6832367199))
            Line((62.9941595991, 53.6832367199), (62.0300845889, 53.361135433))
            ThreePointArc((62.0300845889, 53.361135433), (63.0073411856, 53.6021858588), (64.0106190741, 53.6832367199))
        make_face()
        with BuildLine():
            Line((-70.9893809259, 50.3281080825), (-70.9893809259, 50.4332367199))
            ThreePointArc((-70.9893809259, 50.4332367199), (-71.4967361998, 50.4590442602), (-71.9988540371, 50.5362004695))
            Line((-71.9988540371, 50.5362004695), (-70.9893809259, 50.3281080825))
        make_face()
        with BuildLine():
            Line((-25.0641240271, 53.6143692756), (-25.5241895532, 53.6832367199))
            Line((-25.5241895532, 53.6832367199), (-25.9893809259, 53.6832367199))
            ThreePointArc((-25.9893809259, 53.6832367199), (-25.5254727848, 53.6659960796), (-25.0641240271, 53.6143692756))
        make_face()
        with BuildLine():
            ThreePointArc((64.0106190741, 41.1832367199), (68.4300364565, 43.0138193375), (70.2606190741, 47.4332367199))
            Line((70.2606190741, 47.4332367199), (64.0106190741, 47.4332367199))
            Line((64.0106190741, 47.4332367199), (64.0106190741, 44.5232172885))
            ThreePointArc((64.0106190741, 44.5232172885), (64.2740472184, 44.0062801912), (64.3648190741, 43.4332367199))
            ThreePointArc((64.3648190741, 43.4332367199), (64.2740472184, 42.8601932486), (64.0106190741, 42.3432561512))
            Line((64.0106190741, 42.3432561512), (64.0106190741, 41.1832367199))
        make_face()
    extrude(amount=F1_DEPTH)


solid = f1.part
